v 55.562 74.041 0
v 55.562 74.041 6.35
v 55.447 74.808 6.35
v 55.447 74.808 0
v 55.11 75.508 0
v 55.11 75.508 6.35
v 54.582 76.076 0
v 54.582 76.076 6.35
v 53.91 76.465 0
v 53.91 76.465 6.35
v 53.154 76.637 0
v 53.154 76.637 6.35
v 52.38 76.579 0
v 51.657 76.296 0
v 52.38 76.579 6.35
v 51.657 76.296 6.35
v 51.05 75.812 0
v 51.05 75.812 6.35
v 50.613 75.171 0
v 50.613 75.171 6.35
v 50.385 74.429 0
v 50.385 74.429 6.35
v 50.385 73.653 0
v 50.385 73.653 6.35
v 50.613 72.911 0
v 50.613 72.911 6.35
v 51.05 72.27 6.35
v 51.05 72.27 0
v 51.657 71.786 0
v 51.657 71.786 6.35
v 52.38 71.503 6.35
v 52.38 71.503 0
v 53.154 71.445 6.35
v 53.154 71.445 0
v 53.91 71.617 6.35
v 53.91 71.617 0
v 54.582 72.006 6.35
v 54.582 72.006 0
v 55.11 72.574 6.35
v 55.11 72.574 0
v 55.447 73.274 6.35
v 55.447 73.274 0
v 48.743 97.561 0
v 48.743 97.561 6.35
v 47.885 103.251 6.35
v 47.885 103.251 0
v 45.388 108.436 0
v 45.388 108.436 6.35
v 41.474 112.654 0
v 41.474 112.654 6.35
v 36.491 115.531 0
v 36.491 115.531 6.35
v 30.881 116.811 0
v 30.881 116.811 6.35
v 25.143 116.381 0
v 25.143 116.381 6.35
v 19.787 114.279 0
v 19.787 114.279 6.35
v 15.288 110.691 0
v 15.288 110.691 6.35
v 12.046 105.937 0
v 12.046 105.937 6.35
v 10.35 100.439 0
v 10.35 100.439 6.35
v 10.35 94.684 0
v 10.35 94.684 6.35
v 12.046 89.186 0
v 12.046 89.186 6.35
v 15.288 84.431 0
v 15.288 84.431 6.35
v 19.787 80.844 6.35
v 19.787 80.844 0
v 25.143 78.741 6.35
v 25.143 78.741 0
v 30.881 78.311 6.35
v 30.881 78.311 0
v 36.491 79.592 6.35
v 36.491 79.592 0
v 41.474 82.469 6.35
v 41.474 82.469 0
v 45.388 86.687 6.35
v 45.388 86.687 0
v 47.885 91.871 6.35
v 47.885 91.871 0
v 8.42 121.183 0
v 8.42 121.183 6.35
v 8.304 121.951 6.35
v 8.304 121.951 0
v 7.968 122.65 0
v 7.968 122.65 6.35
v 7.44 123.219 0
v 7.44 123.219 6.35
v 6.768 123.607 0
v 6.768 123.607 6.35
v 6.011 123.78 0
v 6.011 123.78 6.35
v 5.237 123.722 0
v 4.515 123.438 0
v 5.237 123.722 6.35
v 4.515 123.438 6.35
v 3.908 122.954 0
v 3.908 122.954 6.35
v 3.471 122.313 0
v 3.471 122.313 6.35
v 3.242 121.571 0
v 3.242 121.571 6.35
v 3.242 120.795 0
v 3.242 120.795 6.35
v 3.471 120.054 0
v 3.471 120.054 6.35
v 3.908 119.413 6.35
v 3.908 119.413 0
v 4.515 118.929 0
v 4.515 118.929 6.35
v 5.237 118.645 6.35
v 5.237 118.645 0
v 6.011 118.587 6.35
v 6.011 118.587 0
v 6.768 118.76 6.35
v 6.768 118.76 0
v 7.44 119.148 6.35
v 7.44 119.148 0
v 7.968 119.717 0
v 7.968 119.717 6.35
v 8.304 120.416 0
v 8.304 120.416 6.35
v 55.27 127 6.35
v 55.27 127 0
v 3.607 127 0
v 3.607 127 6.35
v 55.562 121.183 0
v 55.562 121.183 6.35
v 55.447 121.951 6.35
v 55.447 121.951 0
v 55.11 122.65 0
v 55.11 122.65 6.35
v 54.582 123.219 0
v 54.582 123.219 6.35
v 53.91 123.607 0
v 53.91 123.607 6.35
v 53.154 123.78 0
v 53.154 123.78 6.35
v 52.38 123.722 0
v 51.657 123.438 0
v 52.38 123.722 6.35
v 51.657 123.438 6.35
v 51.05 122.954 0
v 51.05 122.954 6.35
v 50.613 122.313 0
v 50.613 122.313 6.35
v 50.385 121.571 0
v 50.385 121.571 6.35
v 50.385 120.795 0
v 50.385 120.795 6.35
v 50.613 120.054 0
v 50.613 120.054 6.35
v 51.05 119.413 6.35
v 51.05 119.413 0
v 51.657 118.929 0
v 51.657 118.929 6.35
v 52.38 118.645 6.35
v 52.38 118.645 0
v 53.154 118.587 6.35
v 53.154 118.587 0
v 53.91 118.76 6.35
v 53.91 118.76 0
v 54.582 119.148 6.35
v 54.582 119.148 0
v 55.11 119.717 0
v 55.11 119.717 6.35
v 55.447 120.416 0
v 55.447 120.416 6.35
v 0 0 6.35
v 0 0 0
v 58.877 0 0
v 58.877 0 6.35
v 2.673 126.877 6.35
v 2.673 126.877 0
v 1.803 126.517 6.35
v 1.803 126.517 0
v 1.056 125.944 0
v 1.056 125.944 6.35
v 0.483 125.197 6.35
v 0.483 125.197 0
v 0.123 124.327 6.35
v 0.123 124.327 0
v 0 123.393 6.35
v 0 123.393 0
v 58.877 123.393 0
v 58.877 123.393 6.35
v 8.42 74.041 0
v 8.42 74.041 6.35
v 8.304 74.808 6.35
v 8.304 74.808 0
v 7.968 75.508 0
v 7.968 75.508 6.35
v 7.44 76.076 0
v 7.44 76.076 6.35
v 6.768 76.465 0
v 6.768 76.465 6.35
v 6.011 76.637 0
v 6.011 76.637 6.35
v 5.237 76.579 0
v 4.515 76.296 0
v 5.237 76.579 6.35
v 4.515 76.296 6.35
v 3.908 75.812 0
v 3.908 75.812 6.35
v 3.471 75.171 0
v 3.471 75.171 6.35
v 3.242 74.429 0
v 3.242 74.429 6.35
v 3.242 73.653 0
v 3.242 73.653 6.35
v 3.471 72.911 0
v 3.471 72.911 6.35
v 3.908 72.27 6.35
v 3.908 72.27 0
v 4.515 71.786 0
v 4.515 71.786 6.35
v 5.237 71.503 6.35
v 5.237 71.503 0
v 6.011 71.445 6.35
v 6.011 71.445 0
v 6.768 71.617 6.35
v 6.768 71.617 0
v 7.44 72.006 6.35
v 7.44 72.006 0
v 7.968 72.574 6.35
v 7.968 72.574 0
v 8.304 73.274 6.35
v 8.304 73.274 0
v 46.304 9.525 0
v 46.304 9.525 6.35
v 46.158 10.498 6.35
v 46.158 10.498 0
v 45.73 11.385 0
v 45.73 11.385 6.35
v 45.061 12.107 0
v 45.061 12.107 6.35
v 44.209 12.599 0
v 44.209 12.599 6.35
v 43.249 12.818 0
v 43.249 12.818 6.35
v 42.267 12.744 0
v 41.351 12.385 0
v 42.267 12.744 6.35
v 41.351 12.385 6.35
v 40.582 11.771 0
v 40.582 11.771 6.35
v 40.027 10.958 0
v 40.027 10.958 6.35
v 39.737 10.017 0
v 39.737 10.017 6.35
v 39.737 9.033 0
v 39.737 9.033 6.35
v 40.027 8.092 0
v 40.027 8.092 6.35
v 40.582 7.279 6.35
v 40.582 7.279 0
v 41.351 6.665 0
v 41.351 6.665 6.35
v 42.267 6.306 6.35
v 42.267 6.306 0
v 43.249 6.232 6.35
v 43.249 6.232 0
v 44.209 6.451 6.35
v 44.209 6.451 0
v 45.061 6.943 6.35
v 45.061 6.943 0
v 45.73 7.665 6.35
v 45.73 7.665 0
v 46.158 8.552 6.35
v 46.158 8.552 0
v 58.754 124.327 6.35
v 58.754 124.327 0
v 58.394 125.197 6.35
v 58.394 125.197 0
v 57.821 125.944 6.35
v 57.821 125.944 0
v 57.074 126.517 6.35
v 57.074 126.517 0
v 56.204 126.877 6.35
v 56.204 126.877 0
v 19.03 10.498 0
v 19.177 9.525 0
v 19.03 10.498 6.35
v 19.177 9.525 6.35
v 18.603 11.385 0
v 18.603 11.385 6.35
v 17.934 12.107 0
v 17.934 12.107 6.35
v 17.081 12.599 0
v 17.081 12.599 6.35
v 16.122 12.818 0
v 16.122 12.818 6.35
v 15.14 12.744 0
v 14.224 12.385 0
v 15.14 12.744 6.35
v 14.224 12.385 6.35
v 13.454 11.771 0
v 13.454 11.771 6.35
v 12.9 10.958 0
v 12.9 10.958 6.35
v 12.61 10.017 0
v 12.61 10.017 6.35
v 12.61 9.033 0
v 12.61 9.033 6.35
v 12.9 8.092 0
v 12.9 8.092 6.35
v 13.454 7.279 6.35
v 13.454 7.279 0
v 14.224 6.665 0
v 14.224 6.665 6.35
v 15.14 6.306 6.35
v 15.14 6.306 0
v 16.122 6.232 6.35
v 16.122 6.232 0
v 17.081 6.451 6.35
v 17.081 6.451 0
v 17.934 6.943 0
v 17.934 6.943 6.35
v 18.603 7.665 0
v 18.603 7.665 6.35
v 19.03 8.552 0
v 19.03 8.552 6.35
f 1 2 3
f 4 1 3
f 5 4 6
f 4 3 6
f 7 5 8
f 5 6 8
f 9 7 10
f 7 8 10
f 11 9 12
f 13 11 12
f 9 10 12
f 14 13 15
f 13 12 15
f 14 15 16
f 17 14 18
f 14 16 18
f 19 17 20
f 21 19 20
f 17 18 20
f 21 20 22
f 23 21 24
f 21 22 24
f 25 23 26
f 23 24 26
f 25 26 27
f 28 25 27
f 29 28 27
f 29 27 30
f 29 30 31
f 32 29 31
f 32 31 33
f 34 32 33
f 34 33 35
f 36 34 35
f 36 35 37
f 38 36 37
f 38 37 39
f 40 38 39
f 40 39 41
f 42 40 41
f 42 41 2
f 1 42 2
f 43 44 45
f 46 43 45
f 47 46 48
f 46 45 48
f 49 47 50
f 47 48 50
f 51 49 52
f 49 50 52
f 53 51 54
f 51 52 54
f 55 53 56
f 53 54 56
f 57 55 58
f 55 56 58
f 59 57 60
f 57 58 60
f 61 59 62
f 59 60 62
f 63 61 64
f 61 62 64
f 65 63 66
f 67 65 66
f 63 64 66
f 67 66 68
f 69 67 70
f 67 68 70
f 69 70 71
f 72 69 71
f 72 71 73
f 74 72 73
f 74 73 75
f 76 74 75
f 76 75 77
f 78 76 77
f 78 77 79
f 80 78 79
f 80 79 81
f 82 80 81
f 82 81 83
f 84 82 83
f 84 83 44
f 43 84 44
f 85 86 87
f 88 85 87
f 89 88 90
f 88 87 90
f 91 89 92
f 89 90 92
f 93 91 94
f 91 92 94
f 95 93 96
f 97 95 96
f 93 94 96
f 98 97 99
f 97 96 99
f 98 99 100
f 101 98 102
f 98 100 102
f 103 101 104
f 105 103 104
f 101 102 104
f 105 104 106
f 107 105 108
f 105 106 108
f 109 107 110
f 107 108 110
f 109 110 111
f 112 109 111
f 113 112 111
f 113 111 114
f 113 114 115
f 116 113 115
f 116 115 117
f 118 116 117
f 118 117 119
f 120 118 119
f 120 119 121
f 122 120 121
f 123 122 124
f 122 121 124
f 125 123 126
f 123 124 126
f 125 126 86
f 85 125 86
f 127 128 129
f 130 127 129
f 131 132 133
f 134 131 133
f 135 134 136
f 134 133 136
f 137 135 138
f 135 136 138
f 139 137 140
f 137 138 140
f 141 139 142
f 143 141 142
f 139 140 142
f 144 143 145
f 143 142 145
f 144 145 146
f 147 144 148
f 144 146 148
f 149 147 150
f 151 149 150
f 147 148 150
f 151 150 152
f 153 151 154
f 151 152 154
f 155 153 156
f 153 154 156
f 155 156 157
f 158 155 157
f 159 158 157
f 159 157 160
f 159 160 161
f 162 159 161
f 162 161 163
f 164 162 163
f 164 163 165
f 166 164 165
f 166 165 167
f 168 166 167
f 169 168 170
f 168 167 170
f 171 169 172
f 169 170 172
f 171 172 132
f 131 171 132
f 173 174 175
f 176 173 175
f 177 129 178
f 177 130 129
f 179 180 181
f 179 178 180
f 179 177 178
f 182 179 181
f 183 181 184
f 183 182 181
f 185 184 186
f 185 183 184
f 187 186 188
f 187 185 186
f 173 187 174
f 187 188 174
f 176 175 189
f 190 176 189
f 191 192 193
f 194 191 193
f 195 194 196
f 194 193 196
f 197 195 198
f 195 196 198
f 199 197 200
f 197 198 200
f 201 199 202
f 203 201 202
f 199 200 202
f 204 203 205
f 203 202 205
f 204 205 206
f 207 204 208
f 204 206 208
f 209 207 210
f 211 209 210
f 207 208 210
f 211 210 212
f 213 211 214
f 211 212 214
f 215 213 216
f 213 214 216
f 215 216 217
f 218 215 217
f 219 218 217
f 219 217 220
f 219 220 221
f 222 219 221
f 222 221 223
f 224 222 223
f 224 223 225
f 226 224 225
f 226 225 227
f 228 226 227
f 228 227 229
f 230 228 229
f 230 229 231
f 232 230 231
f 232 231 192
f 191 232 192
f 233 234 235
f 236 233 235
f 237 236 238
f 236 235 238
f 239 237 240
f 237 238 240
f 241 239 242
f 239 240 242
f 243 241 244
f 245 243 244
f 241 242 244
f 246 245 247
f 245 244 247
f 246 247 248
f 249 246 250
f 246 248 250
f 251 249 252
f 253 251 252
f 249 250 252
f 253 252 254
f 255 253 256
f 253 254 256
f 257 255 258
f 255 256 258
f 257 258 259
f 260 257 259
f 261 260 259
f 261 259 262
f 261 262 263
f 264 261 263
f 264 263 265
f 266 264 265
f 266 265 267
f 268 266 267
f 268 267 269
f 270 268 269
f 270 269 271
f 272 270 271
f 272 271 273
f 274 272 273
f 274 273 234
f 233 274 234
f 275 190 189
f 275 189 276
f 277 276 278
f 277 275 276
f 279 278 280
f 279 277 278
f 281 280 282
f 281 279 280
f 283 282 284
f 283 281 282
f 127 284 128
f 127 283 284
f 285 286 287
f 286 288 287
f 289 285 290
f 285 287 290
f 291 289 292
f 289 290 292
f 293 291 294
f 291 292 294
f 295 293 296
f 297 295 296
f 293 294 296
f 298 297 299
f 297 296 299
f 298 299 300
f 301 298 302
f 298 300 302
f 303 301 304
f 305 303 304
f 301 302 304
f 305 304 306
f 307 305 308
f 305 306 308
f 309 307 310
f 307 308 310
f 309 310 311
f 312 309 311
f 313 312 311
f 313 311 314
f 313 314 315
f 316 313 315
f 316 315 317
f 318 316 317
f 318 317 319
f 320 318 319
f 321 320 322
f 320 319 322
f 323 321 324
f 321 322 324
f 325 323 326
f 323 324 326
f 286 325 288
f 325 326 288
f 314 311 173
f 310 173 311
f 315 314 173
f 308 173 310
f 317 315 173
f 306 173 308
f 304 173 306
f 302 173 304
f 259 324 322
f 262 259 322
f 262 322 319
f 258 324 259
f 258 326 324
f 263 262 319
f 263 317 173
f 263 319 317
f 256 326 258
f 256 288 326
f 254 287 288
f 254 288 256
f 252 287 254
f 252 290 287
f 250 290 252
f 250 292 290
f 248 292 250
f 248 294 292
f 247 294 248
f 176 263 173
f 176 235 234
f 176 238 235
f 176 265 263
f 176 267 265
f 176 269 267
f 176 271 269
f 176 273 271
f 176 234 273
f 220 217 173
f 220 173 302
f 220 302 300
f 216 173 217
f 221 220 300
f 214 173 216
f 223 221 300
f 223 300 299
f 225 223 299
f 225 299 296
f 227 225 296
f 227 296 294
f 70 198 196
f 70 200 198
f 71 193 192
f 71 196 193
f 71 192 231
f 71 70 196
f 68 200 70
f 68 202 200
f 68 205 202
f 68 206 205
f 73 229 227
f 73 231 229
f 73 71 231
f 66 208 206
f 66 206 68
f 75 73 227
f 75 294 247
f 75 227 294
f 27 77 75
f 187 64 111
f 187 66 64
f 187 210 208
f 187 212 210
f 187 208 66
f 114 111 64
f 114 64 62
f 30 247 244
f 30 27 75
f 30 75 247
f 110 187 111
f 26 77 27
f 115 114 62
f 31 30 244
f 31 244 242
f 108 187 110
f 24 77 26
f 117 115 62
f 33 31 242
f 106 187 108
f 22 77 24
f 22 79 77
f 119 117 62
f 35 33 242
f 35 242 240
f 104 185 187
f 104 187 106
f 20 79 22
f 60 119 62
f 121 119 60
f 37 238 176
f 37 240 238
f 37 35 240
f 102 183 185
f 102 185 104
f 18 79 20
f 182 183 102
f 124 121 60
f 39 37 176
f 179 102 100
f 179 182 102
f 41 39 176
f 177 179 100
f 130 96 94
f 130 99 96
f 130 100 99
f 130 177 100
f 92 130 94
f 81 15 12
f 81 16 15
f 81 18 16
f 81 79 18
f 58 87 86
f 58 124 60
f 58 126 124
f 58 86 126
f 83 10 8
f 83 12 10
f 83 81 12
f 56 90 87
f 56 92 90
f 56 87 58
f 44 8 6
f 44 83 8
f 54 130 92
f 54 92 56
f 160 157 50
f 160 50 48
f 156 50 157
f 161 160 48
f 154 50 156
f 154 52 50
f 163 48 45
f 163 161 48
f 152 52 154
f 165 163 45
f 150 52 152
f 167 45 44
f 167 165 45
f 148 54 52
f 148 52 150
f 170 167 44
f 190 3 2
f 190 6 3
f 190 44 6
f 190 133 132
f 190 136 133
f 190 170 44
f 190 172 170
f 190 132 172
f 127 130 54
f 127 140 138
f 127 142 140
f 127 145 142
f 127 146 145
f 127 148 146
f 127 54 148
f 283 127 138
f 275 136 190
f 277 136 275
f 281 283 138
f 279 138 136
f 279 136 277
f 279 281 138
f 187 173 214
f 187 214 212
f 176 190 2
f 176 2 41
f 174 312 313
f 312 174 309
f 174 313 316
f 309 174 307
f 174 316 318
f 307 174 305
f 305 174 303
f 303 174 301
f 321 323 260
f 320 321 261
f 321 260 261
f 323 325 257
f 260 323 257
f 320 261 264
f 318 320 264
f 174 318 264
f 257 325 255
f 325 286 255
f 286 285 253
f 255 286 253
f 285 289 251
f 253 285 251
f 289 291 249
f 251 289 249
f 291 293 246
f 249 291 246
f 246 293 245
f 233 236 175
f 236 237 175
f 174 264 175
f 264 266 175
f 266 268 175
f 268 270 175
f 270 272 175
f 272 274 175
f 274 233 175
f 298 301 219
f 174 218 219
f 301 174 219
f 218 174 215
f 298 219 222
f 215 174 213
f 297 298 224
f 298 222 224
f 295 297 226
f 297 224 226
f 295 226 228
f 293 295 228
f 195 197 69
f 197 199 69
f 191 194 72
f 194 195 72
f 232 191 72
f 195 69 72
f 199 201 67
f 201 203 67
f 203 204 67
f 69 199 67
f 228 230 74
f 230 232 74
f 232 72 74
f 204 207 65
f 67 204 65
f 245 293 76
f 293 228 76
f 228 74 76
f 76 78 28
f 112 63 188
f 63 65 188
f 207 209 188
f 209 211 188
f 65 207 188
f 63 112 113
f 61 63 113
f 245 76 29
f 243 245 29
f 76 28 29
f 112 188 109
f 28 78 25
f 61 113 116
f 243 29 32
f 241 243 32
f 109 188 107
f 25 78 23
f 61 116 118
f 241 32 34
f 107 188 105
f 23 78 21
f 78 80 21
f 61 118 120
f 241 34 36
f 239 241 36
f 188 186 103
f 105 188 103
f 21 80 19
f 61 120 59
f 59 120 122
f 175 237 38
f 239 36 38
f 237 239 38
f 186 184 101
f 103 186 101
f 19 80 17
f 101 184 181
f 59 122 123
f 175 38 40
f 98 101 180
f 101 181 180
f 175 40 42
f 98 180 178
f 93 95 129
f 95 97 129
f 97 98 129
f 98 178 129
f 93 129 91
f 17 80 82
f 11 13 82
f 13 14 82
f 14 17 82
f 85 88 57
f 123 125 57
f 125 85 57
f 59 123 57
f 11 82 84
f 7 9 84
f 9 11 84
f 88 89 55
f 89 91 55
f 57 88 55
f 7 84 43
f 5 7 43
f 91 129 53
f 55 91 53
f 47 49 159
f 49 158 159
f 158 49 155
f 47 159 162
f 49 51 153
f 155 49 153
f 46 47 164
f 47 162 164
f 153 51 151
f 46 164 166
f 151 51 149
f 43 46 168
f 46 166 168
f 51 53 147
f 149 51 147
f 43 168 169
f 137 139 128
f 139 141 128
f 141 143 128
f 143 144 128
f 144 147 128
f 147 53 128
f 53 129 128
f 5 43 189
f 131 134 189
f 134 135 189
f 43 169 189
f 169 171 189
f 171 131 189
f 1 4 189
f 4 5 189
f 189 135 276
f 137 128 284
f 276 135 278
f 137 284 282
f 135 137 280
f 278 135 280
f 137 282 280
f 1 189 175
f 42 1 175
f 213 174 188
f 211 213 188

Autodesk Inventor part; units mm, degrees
ref_plane "YZ Plane" through (0, 0, 0) normal (1, 0, 0) x (0, 1, 0)
ref_plane "XZ Plane" through (0, 0, 0) normal (0, 1, 0) x (-1, 0, 0)
ref_plane "XY Plane" through (0, 0, 0) normal (0, 0, 1) x (1, 0, 0)
sketch "Sketch1" plane through (0, 0, 0) normal (0, 0, 1) x (1, 0, 0)
  line L0 (0, 0) -> (58.8772, 0)
  line L1 (58.8772, 0) -> (58.8772, 127)
  line L2 (58.8772, 127) -> (0, 127)
  line L3 (0, 127) -> (0, 0)
  dimension "d0" = 58.8772
  dimension "d1" = 127
extrude "Extrusion1" add sketch "Sketch1" along normal blind 6.35
sketch "Sketch2" plane through (0, 0, 6.35) normal (0, 0, 1) x (1, 0, 0)
  circle A0 centre (29.4386, 97.5614) radius 19.304
  line L0 (58.8772, 127) -> (0, 127) projected
  line L1 (0, 127) -> (0, 0) projected
  line L2 (58.8772, 0) -> (58.8772, 127) projected
  line L3 (29.4386, 127) -> (29.4386, 0)
  line L4 (0, 0) -> (58.8772, 0) projected
  dimension "d4" = 38.608
  dimension "d5" = 29.4386
extrude "Extrusion2" cut sketch "Sketch2" against normal blind 6.35 contours A0 L3 | L3 A0
sketch "Sketch3" plane through (0, 0, 6.35) normal (0, 0, 1) x (1, 0, 0)
  circle A0 centre (5.8166, 121.1834) radius 2.6035
  line L0 (58.8772, 127) -> (0, 127) projected
  line L1 (0, 127) -> (0, 0) projected
  circle A1 centre (5.8166, 74.041) radius 2.6035
  circle A2 centre (52.959, 121.1834) radius 2.6035
  circle A3 centre (52.959, 74.041) radius 2.6035
  dimension "d10" = 5.207
  dimension "d11" = 5.8166
  dimension "d12" = 5.8166
  dimension "d15" = 47.1424
  dimension "d18" = 47.1424
extrude "Extrusion3" cut sketch "Sketch3" against normal blind 6.35
fillet "Fillet1" radius 3.6068 2 edges at (0, 127, 3.175) (58.8772, 127, 3.175)
sketch "Sketch4" plane through (0, 0, 6.35) normal (0, 0, 1) x (1, 0, 0)
  circle A0 centre (15.875, 9.525) radius 3.302
  circle A1 centre (43.0022, 9.525) radius 3.302
  line L0 (0, 0) -> (58.8772, 0) projected
  line L1 (58.8772, 0) -> (58.8772, 123.3932) projected
  line L2 (0, 123.3932) -> (0, 0) projected
  dimension "d24" = 6.604
  dimension "d25" = 6.604
  dimension "d26" = 9.525
  dimension "d27" = 9.525
  dimension "d28" = 15.875
  dimension "d29" = 15.875
extrude "Extrusion4" cut sketch "Sketch4" against normal blind 25.4
properties part number "Motor Support" material "Aluminum 6061"
